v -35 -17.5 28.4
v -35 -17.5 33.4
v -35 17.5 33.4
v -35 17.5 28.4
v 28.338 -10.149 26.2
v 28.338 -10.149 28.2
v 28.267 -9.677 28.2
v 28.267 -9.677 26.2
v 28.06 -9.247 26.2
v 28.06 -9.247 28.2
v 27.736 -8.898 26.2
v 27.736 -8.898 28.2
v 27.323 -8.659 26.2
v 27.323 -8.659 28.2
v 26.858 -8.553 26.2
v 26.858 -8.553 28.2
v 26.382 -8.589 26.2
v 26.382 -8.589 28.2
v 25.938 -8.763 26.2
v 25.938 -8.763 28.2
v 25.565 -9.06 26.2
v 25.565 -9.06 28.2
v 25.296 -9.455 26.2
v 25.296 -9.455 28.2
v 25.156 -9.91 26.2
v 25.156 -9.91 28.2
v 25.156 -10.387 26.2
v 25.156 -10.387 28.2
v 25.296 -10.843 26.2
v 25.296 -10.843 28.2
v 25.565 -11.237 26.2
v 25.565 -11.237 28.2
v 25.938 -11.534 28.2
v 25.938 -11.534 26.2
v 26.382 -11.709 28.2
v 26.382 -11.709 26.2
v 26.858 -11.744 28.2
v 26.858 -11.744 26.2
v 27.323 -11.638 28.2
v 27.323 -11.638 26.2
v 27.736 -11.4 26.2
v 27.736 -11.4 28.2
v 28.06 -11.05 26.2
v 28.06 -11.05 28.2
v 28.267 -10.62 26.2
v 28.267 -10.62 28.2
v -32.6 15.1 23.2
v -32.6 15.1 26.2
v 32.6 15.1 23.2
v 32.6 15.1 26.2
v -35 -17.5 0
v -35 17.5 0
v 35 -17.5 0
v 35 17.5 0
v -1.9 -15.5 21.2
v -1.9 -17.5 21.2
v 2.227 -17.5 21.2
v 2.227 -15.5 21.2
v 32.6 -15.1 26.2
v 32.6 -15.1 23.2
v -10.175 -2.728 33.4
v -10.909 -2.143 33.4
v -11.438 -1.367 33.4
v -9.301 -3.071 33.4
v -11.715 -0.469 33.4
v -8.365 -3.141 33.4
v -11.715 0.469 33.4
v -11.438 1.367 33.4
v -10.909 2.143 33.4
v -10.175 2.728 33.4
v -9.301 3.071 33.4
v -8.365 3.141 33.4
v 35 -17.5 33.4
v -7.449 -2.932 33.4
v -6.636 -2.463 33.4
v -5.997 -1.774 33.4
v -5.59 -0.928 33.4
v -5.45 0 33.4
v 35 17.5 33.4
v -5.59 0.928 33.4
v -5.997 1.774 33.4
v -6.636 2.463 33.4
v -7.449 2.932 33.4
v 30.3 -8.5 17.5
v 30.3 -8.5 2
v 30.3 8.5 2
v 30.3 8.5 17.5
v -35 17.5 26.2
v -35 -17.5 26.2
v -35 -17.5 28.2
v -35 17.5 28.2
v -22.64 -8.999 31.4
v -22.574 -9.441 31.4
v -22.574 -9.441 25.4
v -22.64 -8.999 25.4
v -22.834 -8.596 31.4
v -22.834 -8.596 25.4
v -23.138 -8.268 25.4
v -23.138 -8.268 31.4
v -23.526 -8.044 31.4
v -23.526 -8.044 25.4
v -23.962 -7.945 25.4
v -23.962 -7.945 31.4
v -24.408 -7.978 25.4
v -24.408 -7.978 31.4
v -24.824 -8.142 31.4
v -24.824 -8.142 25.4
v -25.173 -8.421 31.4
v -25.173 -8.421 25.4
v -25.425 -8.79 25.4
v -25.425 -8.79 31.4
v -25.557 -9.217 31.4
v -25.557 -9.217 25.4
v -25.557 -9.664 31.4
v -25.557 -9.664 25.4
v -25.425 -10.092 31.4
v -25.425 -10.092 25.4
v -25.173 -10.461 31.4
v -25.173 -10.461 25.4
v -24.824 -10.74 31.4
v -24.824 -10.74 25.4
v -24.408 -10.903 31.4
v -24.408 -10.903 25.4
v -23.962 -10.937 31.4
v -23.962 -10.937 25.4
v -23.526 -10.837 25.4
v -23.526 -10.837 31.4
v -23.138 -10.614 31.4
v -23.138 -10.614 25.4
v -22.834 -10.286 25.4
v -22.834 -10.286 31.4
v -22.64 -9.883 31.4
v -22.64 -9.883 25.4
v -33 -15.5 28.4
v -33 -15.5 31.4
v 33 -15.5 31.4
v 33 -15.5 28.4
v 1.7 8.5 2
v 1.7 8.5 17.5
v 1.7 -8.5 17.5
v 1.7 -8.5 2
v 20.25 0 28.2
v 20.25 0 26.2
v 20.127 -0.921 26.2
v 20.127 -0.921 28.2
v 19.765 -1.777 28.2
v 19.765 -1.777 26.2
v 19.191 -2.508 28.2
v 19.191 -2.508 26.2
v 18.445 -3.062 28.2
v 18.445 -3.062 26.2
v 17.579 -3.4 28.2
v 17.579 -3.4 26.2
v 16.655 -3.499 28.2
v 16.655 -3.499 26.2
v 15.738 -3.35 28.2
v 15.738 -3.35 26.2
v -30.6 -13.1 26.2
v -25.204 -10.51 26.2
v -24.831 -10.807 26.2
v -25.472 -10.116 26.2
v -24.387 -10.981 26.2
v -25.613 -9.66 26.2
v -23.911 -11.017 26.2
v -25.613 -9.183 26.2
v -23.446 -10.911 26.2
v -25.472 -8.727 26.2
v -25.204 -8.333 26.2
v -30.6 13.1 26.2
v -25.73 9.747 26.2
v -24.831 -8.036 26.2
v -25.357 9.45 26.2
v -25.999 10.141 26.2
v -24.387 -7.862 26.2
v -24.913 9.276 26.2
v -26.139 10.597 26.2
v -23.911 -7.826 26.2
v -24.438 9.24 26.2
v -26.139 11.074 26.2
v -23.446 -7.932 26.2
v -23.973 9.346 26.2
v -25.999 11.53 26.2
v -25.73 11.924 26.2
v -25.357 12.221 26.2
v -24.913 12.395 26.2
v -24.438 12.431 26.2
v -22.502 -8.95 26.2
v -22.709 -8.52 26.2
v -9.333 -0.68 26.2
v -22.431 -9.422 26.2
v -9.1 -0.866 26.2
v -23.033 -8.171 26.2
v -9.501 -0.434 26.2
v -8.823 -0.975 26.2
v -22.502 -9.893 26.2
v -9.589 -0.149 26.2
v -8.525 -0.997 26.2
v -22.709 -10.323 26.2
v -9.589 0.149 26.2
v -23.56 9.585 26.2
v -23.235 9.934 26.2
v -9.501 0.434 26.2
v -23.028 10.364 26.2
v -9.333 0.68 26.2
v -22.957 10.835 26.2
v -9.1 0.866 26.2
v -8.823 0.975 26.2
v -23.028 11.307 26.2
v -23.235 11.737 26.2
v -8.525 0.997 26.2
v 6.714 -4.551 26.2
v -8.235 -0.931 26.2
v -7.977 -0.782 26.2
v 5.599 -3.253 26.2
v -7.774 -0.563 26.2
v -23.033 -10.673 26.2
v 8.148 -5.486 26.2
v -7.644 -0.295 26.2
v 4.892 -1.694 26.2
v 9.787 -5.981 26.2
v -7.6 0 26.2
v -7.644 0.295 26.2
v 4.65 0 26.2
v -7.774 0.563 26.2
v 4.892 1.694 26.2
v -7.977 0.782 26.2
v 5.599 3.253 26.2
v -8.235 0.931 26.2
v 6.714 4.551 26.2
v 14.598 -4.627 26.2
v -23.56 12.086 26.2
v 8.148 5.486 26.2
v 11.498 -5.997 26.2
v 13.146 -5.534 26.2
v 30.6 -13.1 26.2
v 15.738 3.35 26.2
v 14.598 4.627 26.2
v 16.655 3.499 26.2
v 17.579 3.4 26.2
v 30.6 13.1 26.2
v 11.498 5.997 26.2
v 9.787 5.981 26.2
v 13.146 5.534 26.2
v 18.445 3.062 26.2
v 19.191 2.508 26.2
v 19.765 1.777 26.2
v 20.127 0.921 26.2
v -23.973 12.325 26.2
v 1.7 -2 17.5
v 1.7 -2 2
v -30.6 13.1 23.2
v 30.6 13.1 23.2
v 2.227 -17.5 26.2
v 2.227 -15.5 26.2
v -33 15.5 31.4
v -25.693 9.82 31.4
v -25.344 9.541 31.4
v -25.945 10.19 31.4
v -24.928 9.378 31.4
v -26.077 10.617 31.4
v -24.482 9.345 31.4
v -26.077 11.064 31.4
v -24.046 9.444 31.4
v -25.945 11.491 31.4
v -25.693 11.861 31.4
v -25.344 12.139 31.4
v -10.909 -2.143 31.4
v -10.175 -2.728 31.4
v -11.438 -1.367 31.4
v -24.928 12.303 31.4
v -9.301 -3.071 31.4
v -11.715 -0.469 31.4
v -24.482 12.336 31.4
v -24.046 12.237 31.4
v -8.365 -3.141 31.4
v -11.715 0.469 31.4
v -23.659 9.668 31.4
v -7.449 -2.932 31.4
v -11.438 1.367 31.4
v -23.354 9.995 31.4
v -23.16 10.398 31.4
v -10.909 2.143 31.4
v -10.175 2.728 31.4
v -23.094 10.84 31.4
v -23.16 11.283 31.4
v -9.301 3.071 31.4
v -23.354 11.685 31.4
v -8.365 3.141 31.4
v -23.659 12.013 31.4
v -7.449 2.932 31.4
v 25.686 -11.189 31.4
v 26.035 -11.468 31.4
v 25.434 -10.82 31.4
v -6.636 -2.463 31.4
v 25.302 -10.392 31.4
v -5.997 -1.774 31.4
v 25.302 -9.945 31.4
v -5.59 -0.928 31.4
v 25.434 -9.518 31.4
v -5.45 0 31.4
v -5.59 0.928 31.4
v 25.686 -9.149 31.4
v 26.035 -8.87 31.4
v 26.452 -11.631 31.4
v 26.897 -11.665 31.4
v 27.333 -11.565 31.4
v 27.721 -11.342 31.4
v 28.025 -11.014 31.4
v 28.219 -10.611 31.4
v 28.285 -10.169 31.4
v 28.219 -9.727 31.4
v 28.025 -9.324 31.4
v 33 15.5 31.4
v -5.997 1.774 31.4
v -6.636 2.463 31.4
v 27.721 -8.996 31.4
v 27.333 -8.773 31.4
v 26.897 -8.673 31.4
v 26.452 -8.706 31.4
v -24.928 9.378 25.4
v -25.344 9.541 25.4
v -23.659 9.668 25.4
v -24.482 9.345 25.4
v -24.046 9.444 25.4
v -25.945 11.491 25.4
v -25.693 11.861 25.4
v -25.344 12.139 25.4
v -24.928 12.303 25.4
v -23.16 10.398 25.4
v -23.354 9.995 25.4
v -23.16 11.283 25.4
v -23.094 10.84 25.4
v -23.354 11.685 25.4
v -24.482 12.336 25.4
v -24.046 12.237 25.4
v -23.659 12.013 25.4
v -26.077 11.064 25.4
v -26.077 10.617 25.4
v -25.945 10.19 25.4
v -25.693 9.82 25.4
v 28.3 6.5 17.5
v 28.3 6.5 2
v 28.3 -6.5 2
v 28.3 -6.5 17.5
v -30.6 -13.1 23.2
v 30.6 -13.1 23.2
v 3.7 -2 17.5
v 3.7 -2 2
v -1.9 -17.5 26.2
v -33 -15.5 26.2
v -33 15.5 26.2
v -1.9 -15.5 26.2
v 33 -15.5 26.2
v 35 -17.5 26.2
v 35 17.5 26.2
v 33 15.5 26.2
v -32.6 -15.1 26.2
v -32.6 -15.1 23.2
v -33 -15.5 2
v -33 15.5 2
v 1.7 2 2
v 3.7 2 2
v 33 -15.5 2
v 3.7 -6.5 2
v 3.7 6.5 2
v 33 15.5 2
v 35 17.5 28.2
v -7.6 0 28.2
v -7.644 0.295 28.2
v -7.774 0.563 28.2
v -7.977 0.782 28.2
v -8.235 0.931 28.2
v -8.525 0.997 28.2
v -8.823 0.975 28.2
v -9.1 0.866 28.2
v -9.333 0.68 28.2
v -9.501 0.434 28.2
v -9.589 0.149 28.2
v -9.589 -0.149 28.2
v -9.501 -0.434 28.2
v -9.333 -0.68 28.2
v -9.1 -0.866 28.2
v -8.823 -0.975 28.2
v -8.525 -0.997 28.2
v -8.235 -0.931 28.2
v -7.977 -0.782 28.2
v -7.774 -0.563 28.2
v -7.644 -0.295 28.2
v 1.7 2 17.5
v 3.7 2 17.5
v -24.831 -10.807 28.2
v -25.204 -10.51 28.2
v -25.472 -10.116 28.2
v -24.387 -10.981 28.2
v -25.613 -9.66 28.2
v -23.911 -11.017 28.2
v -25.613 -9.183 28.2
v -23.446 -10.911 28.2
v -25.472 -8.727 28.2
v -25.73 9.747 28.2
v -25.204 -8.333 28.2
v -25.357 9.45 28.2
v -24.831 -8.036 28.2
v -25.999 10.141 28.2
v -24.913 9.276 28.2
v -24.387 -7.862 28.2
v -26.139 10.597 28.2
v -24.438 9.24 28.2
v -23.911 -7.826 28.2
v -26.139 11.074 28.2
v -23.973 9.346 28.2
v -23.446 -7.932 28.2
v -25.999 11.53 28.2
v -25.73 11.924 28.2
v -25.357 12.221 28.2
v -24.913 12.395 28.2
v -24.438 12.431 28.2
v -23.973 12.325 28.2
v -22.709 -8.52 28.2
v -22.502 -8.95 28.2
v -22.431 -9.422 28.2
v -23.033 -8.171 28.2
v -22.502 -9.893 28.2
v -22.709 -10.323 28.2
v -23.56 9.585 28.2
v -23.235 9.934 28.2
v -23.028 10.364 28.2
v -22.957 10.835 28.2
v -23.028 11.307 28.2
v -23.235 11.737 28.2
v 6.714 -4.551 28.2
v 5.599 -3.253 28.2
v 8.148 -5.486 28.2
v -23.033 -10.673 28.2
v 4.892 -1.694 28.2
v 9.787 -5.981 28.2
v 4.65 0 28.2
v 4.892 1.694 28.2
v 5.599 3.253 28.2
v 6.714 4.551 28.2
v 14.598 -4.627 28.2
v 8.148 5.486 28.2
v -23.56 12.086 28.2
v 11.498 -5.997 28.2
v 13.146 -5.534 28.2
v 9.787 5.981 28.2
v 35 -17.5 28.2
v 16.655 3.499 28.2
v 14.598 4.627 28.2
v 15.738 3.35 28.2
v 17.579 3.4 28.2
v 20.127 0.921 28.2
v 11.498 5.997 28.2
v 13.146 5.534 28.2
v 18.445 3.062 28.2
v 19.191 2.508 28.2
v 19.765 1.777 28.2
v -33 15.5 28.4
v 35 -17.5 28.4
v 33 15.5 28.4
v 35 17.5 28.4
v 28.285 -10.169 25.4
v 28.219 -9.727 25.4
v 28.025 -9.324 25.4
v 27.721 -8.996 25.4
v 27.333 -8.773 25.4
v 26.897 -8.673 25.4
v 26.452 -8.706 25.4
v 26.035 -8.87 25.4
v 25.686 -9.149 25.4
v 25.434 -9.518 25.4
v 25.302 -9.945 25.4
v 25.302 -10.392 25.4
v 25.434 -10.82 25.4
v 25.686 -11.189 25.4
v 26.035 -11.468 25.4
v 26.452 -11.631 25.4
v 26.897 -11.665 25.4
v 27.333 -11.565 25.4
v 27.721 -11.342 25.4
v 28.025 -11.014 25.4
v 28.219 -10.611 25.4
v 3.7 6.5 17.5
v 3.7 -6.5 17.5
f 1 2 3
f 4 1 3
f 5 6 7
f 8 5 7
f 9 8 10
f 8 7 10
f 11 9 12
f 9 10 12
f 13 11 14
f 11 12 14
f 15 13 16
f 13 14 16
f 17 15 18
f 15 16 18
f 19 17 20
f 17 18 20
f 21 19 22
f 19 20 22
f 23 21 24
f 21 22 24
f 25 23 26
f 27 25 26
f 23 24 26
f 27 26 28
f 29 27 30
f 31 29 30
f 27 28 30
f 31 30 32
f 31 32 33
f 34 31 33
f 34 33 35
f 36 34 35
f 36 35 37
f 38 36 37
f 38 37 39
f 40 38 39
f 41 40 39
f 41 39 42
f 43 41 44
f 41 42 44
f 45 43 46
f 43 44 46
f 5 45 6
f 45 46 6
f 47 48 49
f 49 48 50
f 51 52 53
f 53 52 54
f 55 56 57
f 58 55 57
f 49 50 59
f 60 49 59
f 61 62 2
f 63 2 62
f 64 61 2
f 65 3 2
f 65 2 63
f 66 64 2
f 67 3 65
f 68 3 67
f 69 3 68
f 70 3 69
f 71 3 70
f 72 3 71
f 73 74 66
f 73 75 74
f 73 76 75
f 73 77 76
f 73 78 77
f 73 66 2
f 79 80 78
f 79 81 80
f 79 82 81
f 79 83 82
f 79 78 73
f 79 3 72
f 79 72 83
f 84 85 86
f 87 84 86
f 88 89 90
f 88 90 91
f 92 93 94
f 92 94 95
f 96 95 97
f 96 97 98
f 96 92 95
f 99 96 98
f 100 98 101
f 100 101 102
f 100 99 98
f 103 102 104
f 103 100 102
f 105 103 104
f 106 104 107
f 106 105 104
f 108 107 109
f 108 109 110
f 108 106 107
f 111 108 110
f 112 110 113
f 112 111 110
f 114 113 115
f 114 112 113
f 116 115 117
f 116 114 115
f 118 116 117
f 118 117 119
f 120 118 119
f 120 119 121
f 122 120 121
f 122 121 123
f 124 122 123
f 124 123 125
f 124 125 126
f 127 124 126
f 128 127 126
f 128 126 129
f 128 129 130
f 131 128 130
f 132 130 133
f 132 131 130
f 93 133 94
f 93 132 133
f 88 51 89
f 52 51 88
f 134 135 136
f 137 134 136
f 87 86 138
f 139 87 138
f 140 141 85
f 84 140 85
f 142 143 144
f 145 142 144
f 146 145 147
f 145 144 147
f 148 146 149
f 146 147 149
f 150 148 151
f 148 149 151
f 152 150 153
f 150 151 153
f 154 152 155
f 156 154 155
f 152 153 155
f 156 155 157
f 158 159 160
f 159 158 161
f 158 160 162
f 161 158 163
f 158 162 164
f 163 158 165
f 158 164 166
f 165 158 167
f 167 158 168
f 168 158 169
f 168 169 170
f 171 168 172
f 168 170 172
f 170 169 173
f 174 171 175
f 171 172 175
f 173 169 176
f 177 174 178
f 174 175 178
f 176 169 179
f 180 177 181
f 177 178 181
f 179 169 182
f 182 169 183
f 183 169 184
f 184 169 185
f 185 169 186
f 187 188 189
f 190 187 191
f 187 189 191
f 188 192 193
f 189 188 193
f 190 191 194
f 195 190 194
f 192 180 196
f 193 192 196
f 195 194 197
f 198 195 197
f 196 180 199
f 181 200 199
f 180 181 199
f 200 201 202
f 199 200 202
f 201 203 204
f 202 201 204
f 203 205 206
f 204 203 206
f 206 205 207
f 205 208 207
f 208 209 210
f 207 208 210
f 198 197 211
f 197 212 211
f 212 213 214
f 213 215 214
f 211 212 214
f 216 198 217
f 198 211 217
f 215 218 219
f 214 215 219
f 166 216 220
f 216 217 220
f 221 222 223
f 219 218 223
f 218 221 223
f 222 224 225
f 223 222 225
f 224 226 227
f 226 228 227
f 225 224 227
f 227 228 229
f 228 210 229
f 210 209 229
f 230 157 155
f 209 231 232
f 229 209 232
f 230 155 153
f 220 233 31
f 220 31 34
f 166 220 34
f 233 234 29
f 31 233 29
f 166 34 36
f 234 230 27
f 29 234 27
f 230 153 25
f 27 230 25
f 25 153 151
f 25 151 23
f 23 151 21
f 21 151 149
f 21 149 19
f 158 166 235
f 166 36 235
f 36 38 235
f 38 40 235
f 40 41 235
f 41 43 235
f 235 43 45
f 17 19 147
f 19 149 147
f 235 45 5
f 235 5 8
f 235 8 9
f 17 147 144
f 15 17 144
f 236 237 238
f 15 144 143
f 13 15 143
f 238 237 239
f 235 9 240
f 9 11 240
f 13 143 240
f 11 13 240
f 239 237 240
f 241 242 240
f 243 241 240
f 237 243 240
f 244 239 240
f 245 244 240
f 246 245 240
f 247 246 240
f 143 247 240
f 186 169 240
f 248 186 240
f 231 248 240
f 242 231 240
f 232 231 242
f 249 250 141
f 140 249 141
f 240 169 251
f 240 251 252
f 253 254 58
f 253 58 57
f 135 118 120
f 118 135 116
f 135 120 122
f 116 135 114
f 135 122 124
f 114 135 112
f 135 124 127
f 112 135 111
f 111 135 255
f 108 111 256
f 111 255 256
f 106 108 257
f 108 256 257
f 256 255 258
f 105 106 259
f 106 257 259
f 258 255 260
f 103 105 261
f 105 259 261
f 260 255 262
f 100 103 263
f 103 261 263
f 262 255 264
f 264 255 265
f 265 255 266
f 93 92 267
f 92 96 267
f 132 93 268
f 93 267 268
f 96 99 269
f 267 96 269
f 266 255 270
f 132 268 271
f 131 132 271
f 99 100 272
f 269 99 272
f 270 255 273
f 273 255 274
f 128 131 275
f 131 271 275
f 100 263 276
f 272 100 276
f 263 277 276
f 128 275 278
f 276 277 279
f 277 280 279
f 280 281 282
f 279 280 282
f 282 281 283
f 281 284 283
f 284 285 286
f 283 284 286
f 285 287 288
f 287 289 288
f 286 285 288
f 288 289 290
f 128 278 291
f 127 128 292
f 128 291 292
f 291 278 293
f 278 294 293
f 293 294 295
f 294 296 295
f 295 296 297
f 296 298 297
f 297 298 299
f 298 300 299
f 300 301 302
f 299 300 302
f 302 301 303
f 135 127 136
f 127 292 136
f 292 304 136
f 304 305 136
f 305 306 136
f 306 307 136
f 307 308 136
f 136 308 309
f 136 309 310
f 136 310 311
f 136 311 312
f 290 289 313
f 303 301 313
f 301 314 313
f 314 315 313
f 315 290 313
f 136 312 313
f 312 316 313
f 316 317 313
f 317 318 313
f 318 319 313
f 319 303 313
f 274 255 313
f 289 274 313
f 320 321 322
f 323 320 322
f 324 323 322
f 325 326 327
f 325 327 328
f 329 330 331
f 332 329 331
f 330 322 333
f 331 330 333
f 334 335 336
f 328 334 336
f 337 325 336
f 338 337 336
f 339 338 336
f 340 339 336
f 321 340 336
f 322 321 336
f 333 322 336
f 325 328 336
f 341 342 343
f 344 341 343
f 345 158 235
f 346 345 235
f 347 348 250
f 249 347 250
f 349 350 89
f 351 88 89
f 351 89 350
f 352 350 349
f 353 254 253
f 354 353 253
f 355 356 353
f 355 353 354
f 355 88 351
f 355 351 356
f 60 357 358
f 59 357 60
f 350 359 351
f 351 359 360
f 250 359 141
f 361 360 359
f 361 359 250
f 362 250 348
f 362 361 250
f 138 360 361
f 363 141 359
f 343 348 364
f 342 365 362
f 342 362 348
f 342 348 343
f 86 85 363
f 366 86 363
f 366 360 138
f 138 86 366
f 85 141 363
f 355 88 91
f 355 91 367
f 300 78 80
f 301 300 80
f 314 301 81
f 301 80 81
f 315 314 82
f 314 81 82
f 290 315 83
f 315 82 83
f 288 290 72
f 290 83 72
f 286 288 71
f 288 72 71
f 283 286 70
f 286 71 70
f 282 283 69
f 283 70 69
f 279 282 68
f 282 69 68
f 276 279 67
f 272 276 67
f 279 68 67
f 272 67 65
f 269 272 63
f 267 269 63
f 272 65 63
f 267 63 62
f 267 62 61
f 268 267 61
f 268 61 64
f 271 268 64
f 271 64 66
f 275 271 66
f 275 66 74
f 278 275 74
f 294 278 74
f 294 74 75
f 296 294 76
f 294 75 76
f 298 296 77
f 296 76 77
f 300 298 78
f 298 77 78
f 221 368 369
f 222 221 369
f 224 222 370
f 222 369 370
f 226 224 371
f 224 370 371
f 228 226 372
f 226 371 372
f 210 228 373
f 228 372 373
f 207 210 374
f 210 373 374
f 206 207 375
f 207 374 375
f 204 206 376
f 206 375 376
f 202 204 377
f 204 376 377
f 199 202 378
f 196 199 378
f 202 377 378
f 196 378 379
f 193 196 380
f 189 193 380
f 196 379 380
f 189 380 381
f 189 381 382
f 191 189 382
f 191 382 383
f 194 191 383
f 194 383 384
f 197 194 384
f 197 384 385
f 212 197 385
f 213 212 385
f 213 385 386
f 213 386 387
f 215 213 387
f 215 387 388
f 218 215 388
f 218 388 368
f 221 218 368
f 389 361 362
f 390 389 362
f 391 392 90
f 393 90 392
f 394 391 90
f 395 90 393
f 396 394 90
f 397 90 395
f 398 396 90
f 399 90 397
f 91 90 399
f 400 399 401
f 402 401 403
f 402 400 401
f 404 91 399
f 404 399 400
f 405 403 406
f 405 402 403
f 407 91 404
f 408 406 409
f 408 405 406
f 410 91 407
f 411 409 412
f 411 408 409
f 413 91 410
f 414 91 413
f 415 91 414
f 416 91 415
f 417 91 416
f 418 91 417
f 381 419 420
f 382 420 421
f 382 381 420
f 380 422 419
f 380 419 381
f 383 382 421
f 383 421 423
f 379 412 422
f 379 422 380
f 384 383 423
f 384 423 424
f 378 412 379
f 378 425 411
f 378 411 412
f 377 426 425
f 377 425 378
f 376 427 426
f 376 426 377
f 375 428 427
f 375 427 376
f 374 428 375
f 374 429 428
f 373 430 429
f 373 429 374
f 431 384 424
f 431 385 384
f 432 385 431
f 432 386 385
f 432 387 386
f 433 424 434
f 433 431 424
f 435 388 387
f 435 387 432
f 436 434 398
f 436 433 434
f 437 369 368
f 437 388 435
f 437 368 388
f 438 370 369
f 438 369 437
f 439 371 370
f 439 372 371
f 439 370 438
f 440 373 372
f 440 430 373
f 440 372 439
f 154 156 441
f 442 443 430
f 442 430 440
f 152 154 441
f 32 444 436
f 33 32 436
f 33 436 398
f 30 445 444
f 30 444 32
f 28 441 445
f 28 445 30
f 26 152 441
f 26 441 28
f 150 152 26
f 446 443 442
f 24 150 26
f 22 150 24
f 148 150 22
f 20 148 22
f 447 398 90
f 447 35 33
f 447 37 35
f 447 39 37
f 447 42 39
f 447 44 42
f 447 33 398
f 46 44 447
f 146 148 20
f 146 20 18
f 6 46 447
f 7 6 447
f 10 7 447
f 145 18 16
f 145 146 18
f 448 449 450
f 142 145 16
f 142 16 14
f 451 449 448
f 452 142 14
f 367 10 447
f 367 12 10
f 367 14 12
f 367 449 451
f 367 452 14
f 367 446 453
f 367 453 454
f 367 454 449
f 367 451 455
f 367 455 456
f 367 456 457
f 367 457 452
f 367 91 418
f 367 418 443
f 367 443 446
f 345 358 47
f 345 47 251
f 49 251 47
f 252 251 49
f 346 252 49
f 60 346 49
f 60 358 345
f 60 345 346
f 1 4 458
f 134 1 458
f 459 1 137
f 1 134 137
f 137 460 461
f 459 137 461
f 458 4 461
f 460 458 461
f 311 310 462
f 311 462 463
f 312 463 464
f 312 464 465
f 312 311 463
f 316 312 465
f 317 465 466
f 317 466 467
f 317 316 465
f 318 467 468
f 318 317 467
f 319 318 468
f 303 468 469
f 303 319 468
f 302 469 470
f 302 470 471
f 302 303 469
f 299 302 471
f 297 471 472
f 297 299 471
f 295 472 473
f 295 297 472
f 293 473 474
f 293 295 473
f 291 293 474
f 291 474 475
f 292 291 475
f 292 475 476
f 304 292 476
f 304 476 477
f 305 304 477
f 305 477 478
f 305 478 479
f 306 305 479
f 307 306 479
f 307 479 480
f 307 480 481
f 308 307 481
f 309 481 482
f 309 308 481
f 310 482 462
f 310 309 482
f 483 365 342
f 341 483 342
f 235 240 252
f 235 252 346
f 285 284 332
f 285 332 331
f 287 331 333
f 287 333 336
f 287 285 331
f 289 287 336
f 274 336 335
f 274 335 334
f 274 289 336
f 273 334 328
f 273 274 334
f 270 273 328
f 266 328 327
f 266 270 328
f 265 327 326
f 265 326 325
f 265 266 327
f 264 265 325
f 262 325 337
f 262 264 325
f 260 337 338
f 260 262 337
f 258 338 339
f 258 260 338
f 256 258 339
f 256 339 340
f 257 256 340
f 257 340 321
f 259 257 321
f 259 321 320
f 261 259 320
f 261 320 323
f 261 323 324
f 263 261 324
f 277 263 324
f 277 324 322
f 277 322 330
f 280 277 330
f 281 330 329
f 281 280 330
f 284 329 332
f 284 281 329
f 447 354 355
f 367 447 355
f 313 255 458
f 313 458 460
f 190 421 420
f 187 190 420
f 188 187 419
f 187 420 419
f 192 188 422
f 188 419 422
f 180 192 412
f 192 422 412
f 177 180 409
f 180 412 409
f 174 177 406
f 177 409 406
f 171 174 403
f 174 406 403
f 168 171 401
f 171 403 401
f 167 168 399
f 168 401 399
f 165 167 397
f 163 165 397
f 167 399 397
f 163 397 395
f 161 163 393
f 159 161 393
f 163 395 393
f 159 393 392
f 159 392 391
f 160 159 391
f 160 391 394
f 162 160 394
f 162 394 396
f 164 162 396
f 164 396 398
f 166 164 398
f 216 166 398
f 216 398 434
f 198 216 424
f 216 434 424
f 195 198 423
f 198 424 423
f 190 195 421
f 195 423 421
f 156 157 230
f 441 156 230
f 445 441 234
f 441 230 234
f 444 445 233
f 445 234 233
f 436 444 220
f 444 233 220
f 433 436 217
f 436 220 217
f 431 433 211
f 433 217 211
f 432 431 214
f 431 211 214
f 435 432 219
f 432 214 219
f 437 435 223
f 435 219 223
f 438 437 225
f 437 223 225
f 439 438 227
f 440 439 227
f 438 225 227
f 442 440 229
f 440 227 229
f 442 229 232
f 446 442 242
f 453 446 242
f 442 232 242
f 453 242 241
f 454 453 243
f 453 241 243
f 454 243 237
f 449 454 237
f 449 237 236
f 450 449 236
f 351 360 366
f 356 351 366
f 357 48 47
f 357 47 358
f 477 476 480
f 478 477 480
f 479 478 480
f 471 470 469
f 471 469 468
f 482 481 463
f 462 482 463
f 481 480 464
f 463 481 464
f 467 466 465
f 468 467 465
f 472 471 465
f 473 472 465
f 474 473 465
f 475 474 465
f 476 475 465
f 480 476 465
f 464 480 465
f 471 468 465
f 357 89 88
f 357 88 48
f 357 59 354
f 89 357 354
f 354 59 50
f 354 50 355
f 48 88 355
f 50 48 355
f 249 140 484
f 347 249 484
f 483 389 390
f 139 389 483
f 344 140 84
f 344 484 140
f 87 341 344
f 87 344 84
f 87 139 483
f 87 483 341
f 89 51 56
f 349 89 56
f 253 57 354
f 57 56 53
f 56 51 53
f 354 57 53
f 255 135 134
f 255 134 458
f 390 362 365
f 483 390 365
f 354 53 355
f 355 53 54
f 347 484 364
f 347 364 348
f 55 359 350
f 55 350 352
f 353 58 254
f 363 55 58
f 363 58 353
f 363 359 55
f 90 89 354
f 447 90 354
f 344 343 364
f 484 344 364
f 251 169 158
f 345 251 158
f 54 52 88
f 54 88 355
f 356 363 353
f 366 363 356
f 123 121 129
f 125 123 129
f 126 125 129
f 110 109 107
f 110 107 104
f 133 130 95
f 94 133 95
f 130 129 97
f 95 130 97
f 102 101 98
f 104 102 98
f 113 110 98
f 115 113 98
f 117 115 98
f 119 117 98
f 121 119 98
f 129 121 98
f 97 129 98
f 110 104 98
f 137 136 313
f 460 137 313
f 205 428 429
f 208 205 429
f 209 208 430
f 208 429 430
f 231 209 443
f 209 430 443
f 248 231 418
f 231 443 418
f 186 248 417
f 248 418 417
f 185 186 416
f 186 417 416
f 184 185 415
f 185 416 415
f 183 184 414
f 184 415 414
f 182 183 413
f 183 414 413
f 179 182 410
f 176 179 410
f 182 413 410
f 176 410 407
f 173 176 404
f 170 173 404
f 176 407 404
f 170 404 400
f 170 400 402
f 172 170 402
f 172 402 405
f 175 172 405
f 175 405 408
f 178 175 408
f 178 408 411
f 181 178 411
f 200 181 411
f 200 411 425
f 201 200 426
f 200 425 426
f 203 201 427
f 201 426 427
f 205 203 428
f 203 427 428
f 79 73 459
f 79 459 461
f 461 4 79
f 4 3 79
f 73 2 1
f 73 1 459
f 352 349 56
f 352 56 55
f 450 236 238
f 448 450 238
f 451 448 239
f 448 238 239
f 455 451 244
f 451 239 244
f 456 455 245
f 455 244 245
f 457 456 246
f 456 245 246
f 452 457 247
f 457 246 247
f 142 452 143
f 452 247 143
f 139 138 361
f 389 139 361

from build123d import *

# Parameters (mm, degrees)
F0_W      = 70
F0_H      = 35
F1_DEPTH  = 2
F2_W      = 70
F2_H      = 35
F2_W_2    = 66
F2_H_2    = 31
F3_DEPTH  = 24.2
F5_DEPTH  = 15.5
F6_W      = 70
F6_H      = 35
F7_DEPTH  = 2
F8_W      = 65.2
F8_H      = 30.2
F8_W_2    = 61.2
F8_H_2    = 26.2
F9_DEPTH  = 3
F11_DEPTH = 25
F13_DEPTH = 5
F14_R     = 1
F15_DEPTH = 3
F17_W     = 70
F17_H     = 35
F18_DEPTH = 2
F19_W     = 70
F19_H     = 35
F19_W_2   = 66
F19_H_2   = 31
F20_DEPTH = 3
F21_R     = 3.15
F22_DEPTH = 2
F23_R     = 1.5
F24_DEPTH = 6
F25_R     = 1.6
F26_DEPTH = 2


with BuildPart() as f1:
    # F0 (on Top) → F1 (new body)
    with BuildSketch(Plane.XY):
        Rectangle(F0_W, F0_H)
    extrude(amount=F1_DEPTH)

    # F2 (on face) → F3 (join)
    with BuildSketch(Plane.XY.offset(2)):
        Rectangle(F2_W, F2_H)
        Rectangle(F2_W_2, F2_H_2, mode=Mode.SUBTRACT)
    extrude(amount=F3_DEPTH)

    # F4 (on face) → F5 (join)
    with BuildSketch(Plane.XY.offset(2)):
        Polygon((3.7, 6.5), (28.3, 6.5), (28.3, -6.5), (3.7, -6.5), (3.7, -2), (1.7, -2), (1.7, -8.5), (30.3, -8.5), (30.3, 8.5), (1.7, 8.5), (1.7, 2), (3.7, 2), align=None)
    extrude(amount=F5_DEPTH)

    # F12 (on face) → F13 (cut)
    with BuildSketch(Plane(origin=(0, 0, 26.2), x_dir=(1, 0, 0), z_dir=(0, 0, -1))):
        Polygon((-1.899776631, 17.714696005), (-1.899776631, 15.3786540031), (-1.899776631, 15.1450503618), (2.227232093, 15.1450503618), (2.227232093, 17.714696005), align=None)
    extrude(amount=F13_DEPTH, mode=Mode.SUBTRACT)


with BuildPart() as f7:
    # F6 (on face) → F7 (new body)
    with BuildSketch(Plane.XY.offset(26.2)):
        Rectangle(F6_W, F6_H)
    extrude(amount=F7_DEPTH)

    # F8 (on face) → F9 (join)
    with BuildSketch(Plane(origin=(0, 0, 26.2), x_dir=(1, 0, 0), z_dir=(0, 0, -1))):
        Rectangle(F8_W, F8_H)
        Rectangle(F8_W_2, F8_H_2, mode=Mode.SUBTRACT)
    extrude(amount=F9_DEPTH)

    # F10 (on face) → F11 (cut)
    with BuildSketch(Plane(origin=(0, 0, 26.2), x_dir=(1, 0, 0), z_dir=(0, 0, -1))):
        with BuildLine():
            ThreePointArc((15.7376033058, -3.3503810132), (16.4913728942, -1.75), (16.75, 0))
            ThreePointArc((16.75, 0), (16.4913728942, 1.75), (15.7376033058, 3.3503810132))
            ThreePointArc((15.7376033058, 3.3503810132), (13.25, 0), (15.7376033058, -3.3503810132))
        make_face()
        with BuildLine():
            ThreePointArc((15.7376033058, 3.3503810132), (16.4913728942, 1.75), (16.75, 0))
            ThreePointArc((16.75, 0), (16.4913728942, -1.75), (15.7376033058, -3.3503810132))
            ThreePointArc((15.7376033058, -3.3503810132), (18.8364577123, -2.8101057302), (20.25, 0))
            ThreePointArc((20.25, 0), (18.8364577123, 2.8101057302), (15.7376033058, 3.3503810132))
        make_face()
        with BuildLine():
            ThreePointArc((15.7376033058, -3.3503810132), (13.25, 0), (15.7376033058, 3.3503810132))
            ThreePointArc((15.7376033058, 3.3503810132), (4.65, 0), (15.7376033058, -3.3503810132))
        make_face()
    extrude(amount=-F11_DEPTH, mode=Mode.SUBTRACT)

    # F14 (on face) → F15 (cut)
    with BuildSketch(Plane.XY.offset(28.2)):
        with Locations((-8.6, 0)):
            Circle(F14_R)
    extrude(amount=-F15_DEPTH, mode=Mode.SUBTRACT)

    # F25 (on face) → F26 (cut)
    with BuildSketch(Plane.XY.offset(28.2)):
        with Locations((-24.5572296758, 10.8354858681)):
            Circle(F25_R)
        with Locations((-24.0306204174, -9.4215996393)):
            Circle(F25_R)
        with Locations((26.737968057, -10.1487416467)):
            Circle(F25_R)
    extrude(amount=-F26_DEPTH, mode=Mode.SUBTRACT)


with BuildPart() as f18:
    # F17 (on offset) → F18 (new body)
    with BuildSketch(Plane.XY.offset(31.4)):
        Rectangle(F17_W, F17_H)
    extrude(amount=F18_DEPTH)

    # F19 (on offset) → F20 (join)
    with BuildSketch(Plane.XY.offset(31.4)):
        Rectangle(F19_W, F19_H)
        Rectangle(F19_W_2, F19_H_2, mode=Mode.SUBTRACT)
    extrude(amount=-F20_DEPTH)

    # F21 (on face) → F22 (cut)
    with BuildSketch(Plane.XY.offset(33.4)):
        with Locations((-8.6, 0)):
            Circle(F21_R)
    extrude(amount=-F22_DEPTH, mode=Mode.SUBTRACT)

    # F23 (on offset) → F24 (join)
    with BuildSketch(Plane.XY.offset(31.4)):
        with Locations((-24.5937554311, 10.8404249086)):
            Circle(F23_R)
        with Locations((-24.0737235235, -9.4408045343)):
            Circle(F23_R)
        with Locations((26.7853572811, -10.1688477976)):
            Circle(F23_R)
    extrude(amount=-F24_DEPTH)


solid = Compound([f1.part, f7.part, f18.part])
